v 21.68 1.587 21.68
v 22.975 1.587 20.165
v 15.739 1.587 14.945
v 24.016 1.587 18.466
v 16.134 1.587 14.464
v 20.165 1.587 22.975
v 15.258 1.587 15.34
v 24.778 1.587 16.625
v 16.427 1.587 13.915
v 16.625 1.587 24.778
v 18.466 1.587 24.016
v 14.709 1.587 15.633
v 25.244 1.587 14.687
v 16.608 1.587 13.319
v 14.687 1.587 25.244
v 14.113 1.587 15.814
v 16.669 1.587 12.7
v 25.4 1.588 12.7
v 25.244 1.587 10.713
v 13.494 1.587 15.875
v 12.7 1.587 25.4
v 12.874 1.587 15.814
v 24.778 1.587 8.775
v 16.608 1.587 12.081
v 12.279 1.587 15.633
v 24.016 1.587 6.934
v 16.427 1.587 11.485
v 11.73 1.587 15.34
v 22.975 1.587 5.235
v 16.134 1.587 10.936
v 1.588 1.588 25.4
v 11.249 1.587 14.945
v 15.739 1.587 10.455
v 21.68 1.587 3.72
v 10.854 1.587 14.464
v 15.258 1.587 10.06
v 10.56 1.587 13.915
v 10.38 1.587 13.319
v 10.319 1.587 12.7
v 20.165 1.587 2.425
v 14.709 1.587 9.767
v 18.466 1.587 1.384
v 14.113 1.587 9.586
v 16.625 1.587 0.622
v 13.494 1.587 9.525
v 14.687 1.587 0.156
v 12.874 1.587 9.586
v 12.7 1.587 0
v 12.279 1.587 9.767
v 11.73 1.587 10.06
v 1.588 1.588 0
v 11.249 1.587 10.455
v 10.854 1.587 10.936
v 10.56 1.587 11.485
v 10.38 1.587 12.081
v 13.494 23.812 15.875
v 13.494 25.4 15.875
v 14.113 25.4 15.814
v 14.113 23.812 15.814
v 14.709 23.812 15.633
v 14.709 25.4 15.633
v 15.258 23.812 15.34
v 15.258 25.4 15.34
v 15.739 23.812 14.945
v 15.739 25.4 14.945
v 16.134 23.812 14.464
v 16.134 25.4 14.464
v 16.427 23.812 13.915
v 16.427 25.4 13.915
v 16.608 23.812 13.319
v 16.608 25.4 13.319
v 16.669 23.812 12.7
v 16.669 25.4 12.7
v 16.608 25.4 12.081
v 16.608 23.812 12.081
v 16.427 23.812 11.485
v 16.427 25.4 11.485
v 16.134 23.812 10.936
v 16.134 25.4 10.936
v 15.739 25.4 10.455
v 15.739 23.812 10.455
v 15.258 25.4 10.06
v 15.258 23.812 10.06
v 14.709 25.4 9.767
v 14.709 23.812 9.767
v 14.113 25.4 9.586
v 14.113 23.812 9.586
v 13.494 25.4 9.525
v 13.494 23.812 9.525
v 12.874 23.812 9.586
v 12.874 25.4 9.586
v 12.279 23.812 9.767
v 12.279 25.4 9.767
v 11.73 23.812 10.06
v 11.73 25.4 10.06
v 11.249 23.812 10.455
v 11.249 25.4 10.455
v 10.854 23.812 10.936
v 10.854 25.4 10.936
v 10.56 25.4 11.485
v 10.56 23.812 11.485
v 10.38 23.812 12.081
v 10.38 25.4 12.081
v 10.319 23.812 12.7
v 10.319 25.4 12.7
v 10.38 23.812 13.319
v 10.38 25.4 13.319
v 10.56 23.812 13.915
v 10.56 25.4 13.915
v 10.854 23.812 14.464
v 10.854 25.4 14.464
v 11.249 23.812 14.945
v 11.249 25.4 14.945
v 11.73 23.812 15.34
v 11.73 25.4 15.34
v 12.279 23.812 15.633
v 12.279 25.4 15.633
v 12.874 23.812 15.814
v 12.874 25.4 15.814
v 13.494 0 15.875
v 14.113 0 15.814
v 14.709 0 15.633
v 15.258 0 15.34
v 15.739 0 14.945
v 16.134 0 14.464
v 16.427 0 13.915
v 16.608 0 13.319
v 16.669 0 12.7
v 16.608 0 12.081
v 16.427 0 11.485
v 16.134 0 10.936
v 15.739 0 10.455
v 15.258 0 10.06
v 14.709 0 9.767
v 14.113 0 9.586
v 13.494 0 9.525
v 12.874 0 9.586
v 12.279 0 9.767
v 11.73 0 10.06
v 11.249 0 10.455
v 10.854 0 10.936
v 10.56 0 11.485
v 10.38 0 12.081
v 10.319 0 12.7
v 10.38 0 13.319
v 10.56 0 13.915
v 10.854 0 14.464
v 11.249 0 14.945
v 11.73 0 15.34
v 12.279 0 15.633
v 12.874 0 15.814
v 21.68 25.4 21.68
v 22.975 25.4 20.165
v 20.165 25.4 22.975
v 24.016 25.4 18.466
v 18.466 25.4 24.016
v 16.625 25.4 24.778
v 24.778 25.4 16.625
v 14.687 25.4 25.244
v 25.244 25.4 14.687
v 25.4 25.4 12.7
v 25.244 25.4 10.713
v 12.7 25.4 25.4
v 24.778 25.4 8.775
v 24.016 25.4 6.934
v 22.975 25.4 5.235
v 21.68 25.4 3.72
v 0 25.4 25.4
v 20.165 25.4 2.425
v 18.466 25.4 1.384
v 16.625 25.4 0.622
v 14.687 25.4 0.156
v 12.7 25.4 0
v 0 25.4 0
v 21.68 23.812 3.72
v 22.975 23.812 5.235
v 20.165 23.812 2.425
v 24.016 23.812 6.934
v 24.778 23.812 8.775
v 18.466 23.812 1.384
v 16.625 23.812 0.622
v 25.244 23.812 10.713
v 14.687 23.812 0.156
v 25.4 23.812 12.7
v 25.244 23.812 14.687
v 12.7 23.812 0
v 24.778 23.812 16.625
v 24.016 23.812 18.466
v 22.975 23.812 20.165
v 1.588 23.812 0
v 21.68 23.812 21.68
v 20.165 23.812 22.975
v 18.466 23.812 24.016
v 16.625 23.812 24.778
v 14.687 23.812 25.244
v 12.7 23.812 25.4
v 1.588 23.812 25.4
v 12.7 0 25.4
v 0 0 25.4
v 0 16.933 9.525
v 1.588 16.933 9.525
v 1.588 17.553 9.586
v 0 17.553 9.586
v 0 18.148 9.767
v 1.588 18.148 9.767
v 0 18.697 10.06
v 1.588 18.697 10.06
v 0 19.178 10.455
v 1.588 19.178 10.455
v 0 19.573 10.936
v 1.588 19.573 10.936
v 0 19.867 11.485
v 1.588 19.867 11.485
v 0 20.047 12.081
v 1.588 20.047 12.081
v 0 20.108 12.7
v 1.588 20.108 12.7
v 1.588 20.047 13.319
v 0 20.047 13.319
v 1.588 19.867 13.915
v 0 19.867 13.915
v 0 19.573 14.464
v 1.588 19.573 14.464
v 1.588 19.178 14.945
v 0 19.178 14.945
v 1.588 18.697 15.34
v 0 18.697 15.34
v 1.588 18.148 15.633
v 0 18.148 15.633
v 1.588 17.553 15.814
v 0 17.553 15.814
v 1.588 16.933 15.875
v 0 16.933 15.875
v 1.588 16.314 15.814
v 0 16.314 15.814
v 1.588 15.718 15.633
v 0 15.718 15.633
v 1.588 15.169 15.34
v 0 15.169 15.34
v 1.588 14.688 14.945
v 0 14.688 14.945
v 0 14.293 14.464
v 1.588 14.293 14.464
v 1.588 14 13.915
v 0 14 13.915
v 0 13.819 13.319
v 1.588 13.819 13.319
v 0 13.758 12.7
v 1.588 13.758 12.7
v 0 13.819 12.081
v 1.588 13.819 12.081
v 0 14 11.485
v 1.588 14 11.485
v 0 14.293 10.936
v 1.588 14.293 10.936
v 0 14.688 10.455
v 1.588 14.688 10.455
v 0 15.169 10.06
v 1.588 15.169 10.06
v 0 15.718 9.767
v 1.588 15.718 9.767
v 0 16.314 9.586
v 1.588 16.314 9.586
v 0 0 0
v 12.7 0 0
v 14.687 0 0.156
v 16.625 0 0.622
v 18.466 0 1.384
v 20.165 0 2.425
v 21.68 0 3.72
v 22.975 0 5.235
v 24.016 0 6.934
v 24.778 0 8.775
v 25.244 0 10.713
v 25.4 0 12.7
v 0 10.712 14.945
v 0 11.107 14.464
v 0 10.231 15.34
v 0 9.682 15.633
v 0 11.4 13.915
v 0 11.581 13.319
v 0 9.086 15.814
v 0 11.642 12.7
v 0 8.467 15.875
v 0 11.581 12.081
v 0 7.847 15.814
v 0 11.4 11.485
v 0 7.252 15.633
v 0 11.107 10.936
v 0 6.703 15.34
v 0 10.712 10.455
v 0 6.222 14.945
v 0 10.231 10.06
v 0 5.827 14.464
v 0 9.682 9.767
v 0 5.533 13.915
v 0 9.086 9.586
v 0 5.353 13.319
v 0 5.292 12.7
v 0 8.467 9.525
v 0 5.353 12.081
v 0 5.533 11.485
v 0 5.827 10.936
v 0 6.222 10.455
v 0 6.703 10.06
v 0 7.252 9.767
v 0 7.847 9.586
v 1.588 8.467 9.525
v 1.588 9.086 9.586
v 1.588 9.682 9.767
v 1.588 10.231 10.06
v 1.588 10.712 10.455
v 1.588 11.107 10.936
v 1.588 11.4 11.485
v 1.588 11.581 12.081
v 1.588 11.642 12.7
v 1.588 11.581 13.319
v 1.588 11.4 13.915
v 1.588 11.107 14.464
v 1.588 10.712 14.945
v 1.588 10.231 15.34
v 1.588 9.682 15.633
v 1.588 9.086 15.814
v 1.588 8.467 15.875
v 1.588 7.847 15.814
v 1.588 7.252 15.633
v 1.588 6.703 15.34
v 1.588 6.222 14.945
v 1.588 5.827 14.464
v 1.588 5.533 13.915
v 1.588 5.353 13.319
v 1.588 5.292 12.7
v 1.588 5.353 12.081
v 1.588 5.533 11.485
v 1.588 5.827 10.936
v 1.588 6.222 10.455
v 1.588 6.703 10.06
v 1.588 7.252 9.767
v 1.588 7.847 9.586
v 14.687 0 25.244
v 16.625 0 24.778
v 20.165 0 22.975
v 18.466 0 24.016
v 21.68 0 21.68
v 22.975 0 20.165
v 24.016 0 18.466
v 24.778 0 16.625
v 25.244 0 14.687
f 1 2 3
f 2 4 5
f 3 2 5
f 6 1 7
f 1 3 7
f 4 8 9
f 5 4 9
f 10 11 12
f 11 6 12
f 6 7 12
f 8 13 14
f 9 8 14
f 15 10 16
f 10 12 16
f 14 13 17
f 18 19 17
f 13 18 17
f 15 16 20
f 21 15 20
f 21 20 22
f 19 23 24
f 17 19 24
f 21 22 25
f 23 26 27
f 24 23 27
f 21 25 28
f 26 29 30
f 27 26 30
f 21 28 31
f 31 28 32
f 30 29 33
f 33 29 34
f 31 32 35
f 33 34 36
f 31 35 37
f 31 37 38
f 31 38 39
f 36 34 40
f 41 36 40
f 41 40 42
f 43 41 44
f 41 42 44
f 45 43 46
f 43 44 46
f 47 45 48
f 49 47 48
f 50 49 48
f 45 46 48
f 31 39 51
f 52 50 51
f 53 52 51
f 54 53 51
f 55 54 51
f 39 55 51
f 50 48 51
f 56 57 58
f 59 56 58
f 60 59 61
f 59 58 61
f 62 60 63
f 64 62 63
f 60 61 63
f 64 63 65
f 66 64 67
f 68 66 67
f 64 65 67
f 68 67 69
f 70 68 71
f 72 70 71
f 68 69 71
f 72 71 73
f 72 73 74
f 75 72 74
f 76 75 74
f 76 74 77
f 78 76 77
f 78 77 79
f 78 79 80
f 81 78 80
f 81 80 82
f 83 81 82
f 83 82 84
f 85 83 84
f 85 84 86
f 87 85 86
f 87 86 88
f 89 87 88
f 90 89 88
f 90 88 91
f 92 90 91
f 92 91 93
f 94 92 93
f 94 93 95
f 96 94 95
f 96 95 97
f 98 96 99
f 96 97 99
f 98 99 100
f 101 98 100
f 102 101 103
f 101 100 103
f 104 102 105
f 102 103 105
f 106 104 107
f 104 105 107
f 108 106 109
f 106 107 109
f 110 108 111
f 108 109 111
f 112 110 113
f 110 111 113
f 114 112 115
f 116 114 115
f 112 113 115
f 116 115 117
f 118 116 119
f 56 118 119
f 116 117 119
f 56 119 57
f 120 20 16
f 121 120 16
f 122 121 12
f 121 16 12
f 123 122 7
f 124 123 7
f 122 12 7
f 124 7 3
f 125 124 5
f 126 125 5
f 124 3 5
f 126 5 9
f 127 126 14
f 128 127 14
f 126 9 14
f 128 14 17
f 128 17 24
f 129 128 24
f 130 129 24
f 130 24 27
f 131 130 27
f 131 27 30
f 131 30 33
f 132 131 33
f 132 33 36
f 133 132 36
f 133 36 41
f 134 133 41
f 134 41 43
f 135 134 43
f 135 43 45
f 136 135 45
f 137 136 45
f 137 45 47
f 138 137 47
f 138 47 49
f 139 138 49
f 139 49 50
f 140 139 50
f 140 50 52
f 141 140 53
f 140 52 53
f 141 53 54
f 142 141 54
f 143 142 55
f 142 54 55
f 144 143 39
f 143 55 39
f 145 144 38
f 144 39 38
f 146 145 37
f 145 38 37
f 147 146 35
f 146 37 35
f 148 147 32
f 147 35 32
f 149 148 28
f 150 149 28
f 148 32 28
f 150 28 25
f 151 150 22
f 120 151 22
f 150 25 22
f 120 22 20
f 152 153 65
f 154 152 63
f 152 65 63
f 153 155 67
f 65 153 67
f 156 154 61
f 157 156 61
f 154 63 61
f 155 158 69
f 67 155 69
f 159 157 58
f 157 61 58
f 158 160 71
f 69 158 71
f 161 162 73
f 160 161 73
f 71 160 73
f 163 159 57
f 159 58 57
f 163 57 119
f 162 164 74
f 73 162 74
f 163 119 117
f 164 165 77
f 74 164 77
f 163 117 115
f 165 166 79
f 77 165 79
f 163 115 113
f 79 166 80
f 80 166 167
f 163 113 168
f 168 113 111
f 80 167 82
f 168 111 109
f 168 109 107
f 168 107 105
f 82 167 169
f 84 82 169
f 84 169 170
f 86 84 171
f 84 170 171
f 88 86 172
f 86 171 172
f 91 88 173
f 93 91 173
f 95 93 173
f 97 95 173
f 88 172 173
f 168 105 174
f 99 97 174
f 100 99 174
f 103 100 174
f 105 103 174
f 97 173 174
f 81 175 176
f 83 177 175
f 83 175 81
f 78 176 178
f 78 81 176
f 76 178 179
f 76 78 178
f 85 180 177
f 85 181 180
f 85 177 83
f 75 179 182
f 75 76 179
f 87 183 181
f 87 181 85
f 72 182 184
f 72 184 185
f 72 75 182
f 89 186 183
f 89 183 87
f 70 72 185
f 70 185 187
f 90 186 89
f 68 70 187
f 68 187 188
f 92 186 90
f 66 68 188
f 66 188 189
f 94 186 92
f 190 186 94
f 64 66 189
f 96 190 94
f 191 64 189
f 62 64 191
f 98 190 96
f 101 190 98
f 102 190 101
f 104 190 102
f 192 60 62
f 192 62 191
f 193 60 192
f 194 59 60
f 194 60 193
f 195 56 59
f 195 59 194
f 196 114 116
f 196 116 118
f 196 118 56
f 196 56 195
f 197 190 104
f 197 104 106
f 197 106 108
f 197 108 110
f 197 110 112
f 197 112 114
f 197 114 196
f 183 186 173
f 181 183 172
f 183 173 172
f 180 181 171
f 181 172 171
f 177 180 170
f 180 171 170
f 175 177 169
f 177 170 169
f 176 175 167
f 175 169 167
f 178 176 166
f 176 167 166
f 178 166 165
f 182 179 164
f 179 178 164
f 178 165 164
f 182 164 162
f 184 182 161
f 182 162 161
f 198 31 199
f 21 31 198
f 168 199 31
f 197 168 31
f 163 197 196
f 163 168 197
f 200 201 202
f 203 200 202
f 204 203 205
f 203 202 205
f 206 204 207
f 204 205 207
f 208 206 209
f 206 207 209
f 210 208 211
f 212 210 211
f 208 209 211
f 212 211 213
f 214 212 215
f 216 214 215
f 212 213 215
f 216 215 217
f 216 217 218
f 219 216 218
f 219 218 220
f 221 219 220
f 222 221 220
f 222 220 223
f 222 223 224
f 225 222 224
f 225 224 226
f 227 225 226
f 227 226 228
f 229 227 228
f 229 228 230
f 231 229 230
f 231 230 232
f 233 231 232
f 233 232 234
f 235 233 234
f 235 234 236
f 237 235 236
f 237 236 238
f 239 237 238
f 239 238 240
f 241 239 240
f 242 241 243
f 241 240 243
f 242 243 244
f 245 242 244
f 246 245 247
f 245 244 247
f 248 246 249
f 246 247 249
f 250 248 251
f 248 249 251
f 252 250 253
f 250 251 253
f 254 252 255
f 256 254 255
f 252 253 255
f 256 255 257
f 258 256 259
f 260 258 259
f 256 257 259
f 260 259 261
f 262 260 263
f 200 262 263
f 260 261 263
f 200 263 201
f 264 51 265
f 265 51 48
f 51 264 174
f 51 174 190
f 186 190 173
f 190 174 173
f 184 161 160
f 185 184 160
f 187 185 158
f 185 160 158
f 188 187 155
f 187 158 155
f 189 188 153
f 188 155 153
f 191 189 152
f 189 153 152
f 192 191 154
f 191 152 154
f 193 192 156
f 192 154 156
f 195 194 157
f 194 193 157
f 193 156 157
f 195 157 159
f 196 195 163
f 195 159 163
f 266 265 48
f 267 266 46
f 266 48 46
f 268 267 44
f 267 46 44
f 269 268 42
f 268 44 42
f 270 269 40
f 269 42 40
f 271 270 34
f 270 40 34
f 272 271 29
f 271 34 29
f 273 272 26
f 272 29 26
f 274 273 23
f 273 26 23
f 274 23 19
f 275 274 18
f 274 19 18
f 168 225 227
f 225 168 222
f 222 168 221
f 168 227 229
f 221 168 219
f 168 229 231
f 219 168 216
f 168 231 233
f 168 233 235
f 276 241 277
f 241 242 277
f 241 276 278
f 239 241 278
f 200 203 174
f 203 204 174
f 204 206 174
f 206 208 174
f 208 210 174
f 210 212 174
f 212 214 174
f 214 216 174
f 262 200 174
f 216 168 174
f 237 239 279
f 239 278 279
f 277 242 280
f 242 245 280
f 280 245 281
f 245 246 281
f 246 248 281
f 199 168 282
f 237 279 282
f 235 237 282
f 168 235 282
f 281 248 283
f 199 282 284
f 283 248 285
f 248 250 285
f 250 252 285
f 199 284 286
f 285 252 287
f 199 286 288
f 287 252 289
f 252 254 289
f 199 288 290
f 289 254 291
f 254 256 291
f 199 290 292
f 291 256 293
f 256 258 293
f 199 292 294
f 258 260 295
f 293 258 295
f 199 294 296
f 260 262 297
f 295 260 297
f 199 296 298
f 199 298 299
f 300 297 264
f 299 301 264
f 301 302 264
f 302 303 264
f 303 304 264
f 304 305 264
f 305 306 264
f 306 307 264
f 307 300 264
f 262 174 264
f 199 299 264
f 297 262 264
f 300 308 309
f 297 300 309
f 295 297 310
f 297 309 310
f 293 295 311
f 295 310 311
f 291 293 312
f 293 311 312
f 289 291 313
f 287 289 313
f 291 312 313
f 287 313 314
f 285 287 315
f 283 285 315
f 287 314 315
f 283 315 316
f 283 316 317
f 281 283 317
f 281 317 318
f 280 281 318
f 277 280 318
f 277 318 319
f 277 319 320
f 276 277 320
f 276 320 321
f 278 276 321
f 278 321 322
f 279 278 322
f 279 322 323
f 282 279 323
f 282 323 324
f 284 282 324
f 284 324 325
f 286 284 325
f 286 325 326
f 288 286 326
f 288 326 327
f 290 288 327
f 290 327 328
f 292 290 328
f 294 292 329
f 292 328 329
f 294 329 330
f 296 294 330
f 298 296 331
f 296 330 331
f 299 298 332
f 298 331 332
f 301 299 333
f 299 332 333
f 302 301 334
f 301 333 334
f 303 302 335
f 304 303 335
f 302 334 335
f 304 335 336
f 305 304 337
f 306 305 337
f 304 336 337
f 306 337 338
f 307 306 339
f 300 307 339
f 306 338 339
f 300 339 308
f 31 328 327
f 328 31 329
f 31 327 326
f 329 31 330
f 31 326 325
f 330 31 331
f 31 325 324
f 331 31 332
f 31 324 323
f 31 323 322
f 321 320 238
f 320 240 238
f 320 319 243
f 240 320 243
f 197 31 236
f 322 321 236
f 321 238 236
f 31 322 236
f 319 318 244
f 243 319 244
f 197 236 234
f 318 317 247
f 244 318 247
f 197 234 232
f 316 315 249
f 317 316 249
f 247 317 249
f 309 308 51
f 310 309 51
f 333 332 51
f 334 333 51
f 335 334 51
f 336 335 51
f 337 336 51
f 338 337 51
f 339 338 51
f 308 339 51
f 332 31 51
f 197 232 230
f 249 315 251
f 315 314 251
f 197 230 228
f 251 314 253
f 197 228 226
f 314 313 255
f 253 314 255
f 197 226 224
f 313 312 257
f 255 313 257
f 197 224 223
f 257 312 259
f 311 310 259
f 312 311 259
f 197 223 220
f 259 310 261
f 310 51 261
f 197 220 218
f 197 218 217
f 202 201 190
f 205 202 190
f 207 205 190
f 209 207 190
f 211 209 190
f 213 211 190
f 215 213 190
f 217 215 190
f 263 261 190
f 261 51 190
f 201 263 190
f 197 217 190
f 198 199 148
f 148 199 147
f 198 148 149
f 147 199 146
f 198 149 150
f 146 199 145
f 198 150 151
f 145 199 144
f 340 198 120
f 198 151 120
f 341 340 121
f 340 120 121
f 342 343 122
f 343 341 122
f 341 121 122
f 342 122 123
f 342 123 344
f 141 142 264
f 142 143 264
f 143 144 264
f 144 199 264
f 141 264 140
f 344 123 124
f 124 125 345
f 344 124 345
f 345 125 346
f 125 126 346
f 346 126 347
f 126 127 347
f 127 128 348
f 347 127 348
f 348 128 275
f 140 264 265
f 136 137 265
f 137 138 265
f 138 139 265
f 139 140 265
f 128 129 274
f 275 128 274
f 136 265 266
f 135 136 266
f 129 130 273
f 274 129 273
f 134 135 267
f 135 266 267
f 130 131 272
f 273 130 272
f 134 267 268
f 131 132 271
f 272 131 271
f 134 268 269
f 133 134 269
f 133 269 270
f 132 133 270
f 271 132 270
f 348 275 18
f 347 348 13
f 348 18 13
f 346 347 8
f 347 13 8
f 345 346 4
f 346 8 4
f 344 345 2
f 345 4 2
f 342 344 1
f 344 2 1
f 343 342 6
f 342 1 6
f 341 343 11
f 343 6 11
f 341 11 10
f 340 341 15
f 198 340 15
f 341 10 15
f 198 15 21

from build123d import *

# Parameters (mm, degrees)
EXTRUDE_THIN1_DEPTH = 25.4
SKETCH3_R           = 3.175
CUT_EXTRUDE1_DEPTH  = 44.097043475
FILLET1_R           = 12.7
SKETCH5_W           = 25.4
SKETCH5_H           = 1.5875
BOSS_EXTRUDE1_DEPTH = 25.4
SKETCH6_R           = 3.175
CUT_EXTRUDE3_DEPTH  = 25.4


with BuildPart() as part:
    # Sketch1 → Extrude-Thin1 (new body)
    with BuildSketch(Plane.XY):
        Polygon((0, 25.4), (0, 0), (25.4, 0), (25.4, 1.5875), (1.5875, 1.5875), (1.5875, 25.4), align=None)
    extrude(amount=EXTRUDE_THIN1_DEPTH)

    # Sketch3 → Cut-Extrude1 (cut, through all)
    with BuildSketch(Plane(origin=(1.5875, 0, 0), x_dir=(0, 0, -1), z_dir=(1, 0, 0))):
        with Locations((-12.7, 16.933333333)):
            Circle(SKETCH3_R)
        with Locations((-12.7, 8.466666667)):
            Circle(SKETCH3_R)
    extrude(amount=-CUT_EXTRUDE1_DEPTH, mode=Mode.SUBTRACT)

    # Fillet1
    fillet1_edges = [part.edges().sort_by_distance(p)[0] for p in [
        (25.4, 0.79375, 0),
        (25.4, 0.79375, 25.4),
    ]]
    fillet(fillet1_edges, radius=FILLET1_R - 0.0001)  # a hair under: the kernel refuses the full size

    # Sketch5 → Boss-Extrude1 (add)
    with BuildSketch(Plane.ZY):
        with Locations((12.7, 24.60625)):
            Rectangle(SKETCH5_W, SKETCH5_H)
    extrude(amount=-BOSS_EXTRUDE1_DEPTH)

    # Sketch6 → Cut-Extrude3 (cut)
    with BuildSketch(Plane(origin=(0, 25.4, 0), x_dir=(1, 0, 0), z_dir=(0, 1, 0))):
        with Locations(Location((13.49375, -12.7, 0), (0, 0, 270))):
            Circle(SKETCH6_R)
        with BuildLine():
            Line((25.4, -25.4), (25.4, -12.7))
            ThreePointArc((25.4, -12.7), (21.680256104, -21.680256138), (12.699999951, -25.4))
            Line((12.699999951, -25.4), (25.4, -25.4))
        make_face()
        with BuildLine():
            ThreePointArc((12.7, 0), (21.680256121, -3.719743879), (25.4, -12.7))
            Line((25.4, -12.7), (25.4, 0))
            Line((25.4, 0), (12.7, 0))
        make_face()
    extrude(amount=-CUT_EXTRUDE3_DEPTH, mode=Mode.SUBTRACT)


solid = part.part
